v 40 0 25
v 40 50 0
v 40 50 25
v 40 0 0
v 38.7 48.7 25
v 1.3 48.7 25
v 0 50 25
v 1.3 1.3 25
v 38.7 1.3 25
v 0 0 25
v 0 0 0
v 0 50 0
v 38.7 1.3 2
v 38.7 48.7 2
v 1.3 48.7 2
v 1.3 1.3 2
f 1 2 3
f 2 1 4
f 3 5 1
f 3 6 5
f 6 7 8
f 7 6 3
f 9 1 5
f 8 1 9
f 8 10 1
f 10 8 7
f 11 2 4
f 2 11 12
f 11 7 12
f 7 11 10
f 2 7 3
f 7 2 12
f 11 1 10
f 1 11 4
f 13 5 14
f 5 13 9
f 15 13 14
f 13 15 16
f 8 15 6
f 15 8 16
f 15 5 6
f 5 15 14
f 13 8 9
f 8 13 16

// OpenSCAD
$fn = 32;

// ----------------------------------------------------------------------
// Open box: 1.3 mm walls
// ----------------------------------------------------------------------

// --- parameters (mm) ---
box_l = 40;               // outer length, X
box_w = 50;               // outer width, Y
box_h = 25;               // outer height, Z
wall = 1.3;               // wall thickness
floor = 2;                // floor thickness

difference() {
  cube([box_l, box_w, box_h]);
  translate([wall, wall, floor])
    cube([box_l - 2 * wall, box_w - 2 * wall, box_h]);
}
